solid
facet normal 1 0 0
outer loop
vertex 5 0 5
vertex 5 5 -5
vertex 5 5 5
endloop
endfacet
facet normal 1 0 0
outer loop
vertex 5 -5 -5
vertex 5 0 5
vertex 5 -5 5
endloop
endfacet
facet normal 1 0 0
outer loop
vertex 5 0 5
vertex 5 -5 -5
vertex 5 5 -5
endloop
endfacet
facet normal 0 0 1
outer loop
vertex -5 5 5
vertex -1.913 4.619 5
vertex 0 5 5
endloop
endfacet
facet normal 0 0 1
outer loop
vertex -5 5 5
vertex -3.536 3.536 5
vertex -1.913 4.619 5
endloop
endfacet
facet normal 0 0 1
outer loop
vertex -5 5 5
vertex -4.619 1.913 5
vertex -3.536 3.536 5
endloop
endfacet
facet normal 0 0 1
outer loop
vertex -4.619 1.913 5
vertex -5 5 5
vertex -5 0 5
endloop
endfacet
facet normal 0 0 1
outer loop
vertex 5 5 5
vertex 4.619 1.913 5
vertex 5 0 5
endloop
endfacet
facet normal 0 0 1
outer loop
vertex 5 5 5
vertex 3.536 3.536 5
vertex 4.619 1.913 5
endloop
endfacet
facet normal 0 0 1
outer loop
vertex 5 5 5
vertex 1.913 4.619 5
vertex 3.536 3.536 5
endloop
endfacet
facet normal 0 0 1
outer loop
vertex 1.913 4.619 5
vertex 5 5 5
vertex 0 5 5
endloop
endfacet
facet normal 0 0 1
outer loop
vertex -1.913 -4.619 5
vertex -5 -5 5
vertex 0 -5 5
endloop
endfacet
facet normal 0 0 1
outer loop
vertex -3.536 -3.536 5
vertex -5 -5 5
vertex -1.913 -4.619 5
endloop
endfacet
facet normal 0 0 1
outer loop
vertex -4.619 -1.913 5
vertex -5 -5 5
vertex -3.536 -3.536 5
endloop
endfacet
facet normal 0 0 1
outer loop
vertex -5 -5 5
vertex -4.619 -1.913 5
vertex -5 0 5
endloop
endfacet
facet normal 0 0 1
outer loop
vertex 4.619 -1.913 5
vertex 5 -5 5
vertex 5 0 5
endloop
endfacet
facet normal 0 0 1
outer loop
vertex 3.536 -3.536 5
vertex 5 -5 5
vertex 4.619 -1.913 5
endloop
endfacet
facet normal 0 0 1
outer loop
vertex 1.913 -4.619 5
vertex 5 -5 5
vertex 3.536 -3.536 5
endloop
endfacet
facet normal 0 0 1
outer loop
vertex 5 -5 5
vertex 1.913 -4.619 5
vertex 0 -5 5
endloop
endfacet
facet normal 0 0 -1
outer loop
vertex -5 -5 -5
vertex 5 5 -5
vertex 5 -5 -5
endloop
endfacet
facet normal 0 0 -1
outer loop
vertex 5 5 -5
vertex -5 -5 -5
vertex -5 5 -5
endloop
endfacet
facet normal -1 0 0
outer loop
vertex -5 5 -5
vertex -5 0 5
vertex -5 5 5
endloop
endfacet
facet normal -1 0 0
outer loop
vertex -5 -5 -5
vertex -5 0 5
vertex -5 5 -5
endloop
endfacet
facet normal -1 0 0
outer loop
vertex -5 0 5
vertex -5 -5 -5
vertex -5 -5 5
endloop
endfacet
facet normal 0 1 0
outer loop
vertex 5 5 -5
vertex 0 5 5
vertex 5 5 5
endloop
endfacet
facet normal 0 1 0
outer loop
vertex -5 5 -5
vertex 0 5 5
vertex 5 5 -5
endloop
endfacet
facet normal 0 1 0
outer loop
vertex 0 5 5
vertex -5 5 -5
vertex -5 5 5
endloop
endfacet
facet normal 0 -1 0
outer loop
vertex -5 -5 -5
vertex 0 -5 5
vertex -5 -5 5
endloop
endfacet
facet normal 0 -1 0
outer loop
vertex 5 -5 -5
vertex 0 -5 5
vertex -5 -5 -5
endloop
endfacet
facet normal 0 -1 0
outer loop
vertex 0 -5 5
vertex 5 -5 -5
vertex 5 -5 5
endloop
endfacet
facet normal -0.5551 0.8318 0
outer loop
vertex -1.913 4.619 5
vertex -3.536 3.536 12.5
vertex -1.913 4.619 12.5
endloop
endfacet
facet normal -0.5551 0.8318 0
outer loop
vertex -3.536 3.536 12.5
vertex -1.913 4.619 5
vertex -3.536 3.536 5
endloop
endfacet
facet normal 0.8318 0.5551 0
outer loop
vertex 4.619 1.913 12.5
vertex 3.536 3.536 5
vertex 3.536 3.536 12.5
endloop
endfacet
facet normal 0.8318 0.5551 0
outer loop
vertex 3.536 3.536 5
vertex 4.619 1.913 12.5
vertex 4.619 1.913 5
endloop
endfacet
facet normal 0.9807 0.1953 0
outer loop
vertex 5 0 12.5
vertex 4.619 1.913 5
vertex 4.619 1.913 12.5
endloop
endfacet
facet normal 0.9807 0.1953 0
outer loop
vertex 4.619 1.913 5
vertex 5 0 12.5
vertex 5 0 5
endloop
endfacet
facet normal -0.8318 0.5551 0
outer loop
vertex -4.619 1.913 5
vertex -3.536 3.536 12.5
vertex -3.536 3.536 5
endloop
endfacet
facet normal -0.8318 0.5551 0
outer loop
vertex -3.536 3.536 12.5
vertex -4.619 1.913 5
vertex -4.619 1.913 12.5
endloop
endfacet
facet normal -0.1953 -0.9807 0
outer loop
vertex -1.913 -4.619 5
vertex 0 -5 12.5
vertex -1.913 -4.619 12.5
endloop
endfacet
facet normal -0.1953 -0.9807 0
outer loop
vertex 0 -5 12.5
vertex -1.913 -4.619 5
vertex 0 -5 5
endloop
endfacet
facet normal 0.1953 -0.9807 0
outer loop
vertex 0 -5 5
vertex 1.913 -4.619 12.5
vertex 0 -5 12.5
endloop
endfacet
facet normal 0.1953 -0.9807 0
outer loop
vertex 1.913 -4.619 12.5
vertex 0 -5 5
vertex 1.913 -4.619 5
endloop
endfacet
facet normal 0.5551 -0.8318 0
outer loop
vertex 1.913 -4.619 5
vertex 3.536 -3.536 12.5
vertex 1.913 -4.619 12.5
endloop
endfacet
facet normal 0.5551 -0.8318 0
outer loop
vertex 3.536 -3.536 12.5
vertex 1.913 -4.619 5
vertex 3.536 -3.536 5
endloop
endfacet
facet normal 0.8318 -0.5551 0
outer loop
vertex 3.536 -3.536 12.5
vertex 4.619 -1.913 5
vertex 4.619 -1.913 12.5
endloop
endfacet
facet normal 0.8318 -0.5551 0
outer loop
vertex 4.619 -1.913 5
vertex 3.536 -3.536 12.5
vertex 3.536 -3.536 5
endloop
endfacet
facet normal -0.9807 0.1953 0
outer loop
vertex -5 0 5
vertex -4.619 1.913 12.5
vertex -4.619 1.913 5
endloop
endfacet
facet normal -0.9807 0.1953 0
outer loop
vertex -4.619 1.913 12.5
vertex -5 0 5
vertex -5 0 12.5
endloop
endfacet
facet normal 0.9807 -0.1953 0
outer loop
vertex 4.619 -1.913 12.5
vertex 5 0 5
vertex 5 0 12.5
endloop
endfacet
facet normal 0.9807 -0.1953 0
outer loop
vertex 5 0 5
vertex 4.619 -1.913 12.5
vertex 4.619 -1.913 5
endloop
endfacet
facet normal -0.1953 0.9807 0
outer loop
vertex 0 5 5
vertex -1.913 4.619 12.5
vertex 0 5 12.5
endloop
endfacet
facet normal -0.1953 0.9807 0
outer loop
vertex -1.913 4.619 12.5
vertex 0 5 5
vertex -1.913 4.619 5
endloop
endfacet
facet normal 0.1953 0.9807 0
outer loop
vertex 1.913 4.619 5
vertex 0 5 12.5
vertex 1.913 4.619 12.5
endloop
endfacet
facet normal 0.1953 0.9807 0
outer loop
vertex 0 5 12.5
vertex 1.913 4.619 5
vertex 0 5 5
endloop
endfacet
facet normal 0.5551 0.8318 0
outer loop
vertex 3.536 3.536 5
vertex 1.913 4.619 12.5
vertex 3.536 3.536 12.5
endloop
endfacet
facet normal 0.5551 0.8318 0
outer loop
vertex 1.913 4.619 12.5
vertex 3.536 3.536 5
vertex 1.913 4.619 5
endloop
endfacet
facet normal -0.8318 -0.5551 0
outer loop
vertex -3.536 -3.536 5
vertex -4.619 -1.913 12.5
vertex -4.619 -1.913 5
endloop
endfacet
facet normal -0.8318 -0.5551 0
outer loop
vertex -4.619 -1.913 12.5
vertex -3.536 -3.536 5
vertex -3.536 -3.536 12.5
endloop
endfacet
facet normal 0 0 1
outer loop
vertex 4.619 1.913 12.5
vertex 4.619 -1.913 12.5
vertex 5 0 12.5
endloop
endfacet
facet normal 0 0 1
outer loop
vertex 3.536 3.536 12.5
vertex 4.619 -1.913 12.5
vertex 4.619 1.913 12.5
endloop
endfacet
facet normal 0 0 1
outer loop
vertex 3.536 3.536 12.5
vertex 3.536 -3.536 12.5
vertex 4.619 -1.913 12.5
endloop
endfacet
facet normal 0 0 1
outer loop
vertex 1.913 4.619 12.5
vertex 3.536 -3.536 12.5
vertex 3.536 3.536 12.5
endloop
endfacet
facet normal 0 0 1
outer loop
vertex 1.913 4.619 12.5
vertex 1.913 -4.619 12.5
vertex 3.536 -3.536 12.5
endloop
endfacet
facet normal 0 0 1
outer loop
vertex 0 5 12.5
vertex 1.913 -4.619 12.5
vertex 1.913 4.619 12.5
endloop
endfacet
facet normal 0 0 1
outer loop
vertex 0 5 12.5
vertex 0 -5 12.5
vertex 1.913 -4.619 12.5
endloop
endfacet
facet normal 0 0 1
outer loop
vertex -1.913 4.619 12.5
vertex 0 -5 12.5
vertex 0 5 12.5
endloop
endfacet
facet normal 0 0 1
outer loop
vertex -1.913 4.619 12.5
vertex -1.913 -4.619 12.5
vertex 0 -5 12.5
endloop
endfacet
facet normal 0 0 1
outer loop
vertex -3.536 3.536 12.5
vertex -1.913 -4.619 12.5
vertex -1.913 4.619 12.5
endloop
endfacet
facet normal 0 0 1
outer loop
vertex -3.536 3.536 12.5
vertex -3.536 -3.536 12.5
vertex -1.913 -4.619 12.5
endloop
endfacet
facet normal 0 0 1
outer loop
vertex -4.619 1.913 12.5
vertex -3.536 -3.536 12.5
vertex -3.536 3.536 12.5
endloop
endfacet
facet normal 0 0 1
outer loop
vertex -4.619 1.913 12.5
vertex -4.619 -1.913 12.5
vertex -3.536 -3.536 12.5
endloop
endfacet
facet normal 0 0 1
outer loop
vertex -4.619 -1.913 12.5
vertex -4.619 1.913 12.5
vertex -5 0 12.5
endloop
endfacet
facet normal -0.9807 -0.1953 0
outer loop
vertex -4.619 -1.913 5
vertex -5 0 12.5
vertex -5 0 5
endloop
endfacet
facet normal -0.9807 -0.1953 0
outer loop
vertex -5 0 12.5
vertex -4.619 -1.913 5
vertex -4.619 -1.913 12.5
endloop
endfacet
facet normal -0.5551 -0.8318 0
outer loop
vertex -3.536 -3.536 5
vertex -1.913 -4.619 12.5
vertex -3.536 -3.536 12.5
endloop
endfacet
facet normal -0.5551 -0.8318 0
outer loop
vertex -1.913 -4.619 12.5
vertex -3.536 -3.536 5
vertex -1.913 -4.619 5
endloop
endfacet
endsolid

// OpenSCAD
// Size of the Cube (all directions)
cuSize = 10;

// The diameter of the Cylinder
cyDia = 10;

// The height of the Cylinder
cyHei = 15;

// Z-Translation of the Cylinder
tZ = 5;

// Create Cube and move Cylinder by 'tZ'
cube(size = [cuSize, cuSize, cuSize], center = true);
translate([0, 0, tZ])
    cylinder(d = cyDia, h = cyHei, center = true);
